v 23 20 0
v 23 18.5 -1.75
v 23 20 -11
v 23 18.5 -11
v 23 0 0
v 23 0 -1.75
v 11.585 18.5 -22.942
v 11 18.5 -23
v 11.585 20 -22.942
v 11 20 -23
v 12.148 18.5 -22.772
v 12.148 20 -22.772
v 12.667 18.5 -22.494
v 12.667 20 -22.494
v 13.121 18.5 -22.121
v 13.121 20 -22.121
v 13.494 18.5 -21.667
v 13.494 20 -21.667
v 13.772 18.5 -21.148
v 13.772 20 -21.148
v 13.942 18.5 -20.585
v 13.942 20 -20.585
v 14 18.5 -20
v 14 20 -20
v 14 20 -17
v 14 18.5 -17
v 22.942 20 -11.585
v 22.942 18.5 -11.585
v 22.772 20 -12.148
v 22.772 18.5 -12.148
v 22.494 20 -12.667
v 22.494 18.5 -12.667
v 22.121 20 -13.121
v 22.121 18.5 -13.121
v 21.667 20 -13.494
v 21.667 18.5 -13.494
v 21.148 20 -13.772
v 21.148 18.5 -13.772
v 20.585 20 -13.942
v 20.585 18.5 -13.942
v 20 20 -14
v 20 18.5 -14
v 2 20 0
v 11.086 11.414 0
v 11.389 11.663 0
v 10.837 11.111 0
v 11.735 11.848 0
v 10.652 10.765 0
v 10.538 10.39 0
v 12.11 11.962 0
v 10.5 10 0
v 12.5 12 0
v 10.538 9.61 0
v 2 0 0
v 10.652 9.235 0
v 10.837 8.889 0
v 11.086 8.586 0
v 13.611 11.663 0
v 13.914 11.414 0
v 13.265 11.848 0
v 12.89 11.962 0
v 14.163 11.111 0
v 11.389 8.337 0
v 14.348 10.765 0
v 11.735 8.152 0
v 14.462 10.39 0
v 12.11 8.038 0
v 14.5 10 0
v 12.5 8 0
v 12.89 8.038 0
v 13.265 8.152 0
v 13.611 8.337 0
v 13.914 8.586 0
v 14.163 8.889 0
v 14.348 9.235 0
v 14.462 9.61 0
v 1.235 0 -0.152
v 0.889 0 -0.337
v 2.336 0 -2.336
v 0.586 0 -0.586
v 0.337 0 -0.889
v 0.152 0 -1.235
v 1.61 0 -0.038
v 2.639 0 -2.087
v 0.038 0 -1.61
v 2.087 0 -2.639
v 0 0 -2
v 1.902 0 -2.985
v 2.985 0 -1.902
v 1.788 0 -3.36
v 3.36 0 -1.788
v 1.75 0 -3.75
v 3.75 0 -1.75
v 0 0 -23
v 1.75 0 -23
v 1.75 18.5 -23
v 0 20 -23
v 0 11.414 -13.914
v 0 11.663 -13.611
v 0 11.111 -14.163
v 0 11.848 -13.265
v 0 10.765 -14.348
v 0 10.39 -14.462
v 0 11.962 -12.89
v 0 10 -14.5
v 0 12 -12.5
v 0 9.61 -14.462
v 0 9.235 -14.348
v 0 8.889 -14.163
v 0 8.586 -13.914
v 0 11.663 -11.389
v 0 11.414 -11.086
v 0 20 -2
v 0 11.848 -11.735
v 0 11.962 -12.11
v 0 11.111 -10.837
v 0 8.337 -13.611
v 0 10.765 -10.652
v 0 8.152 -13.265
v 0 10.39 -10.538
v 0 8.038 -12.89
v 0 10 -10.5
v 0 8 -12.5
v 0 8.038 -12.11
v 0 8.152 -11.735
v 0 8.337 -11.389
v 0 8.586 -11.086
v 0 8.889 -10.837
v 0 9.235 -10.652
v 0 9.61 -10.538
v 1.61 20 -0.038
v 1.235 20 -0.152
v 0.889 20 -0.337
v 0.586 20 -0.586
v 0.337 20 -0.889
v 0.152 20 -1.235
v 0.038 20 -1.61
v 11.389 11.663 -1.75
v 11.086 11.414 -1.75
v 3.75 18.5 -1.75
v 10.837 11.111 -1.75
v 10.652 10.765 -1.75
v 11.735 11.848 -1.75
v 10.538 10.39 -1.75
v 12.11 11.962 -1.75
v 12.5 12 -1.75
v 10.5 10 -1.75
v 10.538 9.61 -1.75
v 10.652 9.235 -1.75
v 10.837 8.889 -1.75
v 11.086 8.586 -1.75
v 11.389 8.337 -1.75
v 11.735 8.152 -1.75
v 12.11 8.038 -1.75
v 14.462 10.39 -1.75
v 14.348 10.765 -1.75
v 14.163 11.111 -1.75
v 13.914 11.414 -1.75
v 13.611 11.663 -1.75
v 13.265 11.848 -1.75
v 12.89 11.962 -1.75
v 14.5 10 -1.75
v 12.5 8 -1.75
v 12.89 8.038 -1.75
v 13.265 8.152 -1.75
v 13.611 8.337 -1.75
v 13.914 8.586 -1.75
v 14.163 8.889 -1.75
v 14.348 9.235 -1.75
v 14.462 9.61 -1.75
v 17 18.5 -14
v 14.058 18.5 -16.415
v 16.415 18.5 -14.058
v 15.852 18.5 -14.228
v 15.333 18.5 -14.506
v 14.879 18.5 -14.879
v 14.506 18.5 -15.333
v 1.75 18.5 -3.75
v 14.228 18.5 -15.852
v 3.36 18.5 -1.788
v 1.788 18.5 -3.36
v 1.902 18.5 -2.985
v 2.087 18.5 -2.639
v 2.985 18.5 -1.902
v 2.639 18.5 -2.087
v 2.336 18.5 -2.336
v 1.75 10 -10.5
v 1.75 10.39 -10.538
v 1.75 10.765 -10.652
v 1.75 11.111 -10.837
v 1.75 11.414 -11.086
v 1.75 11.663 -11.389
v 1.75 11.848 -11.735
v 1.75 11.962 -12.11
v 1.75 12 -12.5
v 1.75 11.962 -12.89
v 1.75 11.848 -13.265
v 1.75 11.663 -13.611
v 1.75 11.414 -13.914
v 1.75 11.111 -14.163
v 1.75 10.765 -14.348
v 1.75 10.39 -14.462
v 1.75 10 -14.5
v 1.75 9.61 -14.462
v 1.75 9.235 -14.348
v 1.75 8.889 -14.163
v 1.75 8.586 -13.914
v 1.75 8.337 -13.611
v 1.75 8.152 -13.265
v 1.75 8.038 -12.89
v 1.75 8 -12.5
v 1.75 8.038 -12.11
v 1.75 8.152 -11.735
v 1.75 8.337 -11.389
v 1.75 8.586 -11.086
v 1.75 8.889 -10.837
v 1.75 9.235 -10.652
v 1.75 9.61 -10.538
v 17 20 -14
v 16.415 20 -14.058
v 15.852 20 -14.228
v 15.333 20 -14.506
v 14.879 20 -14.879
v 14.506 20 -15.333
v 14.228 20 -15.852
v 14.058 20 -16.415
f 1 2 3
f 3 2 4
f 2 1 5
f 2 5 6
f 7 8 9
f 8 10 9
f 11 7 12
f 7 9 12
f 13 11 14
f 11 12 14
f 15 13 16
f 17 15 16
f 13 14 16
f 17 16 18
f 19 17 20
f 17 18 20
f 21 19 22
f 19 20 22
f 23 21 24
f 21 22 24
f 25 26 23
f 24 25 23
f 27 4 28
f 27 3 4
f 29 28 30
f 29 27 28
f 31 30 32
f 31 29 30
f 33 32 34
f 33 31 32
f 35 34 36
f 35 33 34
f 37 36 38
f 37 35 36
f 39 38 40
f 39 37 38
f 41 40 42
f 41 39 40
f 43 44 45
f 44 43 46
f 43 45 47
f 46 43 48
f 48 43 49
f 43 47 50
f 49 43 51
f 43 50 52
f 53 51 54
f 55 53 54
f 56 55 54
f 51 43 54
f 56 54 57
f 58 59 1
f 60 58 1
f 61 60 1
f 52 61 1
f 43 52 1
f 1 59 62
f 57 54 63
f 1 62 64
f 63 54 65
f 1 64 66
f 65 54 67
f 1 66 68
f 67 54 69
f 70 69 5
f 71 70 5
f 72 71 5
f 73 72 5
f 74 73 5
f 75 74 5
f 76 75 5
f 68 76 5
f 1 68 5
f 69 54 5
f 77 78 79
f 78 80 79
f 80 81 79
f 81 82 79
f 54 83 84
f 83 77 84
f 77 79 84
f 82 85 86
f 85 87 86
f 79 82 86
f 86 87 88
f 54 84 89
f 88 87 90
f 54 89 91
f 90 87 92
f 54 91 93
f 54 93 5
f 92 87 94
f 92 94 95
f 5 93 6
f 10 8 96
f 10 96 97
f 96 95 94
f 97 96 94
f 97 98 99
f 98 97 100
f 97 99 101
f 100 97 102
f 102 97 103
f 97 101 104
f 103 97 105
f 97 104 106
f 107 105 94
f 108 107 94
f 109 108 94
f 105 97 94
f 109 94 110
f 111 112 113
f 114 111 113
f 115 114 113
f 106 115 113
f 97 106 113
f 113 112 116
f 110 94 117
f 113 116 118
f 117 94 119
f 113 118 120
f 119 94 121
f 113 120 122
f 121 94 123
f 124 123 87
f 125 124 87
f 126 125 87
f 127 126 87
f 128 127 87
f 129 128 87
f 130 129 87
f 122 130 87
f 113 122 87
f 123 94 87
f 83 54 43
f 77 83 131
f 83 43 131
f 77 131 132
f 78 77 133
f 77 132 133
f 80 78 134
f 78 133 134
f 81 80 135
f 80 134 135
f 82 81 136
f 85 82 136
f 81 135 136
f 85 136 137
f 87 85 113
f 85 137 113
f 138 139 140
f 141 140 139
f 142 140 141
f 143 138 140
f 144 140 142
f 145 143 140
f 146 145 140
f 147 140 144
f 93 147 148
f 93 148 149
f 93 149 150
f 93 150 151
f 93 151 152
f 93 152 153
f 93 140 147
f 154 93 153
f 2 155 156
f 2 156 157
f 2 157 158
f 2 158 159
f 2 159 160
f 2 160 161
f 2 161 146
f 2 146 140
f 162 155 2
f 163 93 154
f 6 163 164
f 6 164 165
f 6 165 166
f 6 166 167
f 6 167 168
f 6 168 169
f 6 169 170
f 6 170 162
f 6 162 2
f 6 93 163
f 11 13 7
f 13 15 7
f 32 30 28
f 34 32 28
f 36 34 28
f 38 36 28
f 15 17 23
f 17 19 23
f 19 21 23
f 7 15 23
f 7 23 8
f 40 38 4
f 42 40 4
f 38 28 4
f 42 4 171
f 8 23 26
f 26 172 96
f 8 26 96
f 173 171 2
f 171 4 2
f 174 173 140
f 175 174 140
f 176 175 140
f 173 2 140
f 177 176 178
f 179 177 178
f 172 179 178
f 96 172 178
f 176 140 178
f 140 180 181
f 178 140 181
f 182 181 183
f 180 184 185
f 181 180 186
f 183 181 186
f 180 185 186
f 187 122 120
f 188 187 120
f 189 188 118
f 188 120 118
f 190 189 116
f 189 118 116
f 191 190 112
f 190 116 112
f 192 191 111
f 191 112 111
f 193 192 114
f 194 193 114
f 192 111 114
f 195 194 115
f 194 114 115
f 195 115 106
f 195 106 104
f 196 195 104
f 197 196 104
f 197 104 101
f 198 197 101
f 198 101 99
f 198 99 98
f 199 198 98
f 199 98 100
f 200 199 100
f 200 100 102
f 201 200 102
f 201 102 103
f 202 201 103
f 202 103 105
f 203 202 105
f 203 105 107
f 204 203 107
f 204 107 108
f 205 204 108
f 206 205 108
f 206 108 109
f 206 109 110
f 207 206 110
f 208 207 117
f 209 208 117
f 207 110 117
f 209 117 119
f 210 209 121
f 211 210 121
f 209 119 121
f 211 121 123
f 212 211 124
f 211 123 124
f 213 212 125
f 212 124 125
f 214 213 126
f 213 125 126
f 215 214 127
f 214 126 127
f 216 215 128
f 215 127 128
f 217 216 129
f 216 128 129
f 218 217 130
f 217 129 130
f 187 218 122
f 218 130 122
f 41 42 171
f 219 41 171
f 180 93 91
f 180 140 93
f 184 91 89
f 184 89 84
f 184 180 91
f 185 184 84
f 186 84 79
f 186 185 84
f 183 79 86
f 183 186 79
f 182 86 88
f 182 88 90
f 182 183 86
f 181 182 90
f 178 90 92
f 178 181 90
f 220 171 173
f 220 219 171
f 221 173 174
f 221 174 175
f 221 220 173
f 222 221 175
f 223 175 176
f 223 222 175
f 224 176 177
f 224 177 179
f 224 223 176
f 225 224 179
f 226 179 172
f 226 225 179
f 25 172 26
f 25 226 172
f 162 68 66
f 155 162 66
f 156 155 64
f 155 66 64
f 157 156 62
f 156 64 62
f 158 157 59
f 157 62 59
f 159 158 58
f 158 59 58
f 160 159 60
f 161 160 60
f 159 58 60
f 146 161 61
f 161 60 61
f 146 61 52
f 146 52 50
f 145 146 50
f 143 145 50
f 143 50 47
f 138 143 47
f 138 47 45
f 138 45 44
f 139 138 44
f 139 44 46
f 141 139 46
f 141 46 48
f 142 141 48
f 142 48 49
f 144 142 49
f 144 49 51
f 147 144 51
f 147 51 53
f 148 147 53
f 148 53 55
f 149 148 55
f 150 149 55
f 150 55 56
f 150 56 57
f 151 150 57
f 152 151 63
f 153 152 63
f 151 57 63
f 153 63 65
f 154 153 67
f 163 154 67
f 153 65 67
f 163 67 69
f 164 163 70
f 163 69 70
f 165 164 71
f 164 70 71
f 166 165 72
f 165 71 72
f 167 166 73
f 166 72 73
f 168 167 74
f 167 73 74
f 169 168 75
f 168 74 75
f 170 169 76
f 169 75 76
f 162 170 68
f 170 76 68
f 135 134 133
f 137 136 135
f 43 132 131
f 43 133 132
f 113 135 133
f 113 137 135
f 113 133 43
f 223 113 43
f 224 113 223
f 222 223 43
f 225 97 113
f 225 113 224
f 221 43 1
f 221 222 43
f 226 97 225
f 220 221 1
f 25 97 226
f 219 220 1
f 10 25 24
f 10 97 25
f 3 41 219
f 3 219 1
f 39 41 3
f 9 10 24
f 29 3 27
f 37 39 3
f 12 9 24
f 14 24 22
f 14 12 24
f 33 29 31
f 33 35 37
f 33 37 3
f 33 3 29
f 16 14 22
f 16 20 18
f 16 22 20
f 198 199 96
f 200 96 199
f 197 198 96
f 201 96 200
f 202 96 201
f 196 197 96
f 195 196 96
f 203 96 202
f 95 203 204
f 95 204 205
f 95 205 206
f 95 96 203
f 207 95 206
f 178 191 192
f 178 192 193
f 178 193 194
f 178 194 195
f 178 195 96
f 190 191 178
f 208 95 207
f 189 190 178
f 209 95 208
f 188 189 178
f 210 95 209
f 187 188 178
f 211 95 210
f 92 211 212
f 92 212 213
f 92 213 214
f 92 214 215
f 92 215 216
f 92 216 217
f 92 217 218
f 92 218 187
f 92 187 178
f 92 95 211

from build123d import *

# Parameters (mm, degrees)
SALIENTE_EXTRUIR1_DEPTH = 20
CORTAR_EXTRUIR1_DEPTH   = 18.5
REDONDEO1_R             = 2
REDONDEO2_R             = 3
CROQUIS3_R              = 2
CORTAR_EXTRUIR2_DEPTH   = 18.5
CROQUIS4_R              = 2
CORTAR_EXTRUIR3_DEPTH   = 18.5


with BuildPart() as part:
    # Croquis1 → Saliente-Extruir1 (new body)
    with BuildSketch(Plane(origin=(0, 0, 0), x_dir=(1, 0, 0), z_dir=(0, 1, 0))):
        Polygon((0, 0), (23, 0), (23, 14), (14, 14), (14, 23), (0, 23), align=None)
    extrude(amount=SALIENTE_EXTRUIR1_DEPTH)

    # Croquis2 → Cortar-Extruir1 (cut)
    with BuildSketch(Plane.XZ):
        Polygon((1.75, -23), (1.75, -1.75), (23, -1.75), (23, -14), (14, -14), (14, -23), align=None)
    extrude(amount=-CORTAR_EXTRUIR1_DEPTH, mode=Mode.SUBTRACT)

    # Redondeo1
    redondeo1_edges = [part.edges().sort_by_distance(p)[0] for p in [
        (0, 10, 0),
        (1.75, 9.25, -1.75),
    ]]
    fillet(redondeo1_edges, radius=REDONDEO1_R)

    # Redondeo2
    redondeo2_edges = [part.edges().sort_by_distance(p)[0] for p in [
        (14, 19.25, -23),
        (14, 19.25, -14),
        (23, 19.25, -14),
    ]]
    fillet(redondeo2_edges, radius=REDONDEO2_R)

    # Croquis3 → Cortar-Extruir2 (cut)
    with BuildSketch(Plane.ZY):
        with Locations((-12.5, 10)):
            Circle(CROQUIS3_R)
    extrude(amount=-CORTAR_EXTRUIR2_DEPTH, mode=Mode.SUBTRACT)

    # Croquis4 → Cortar-Extruir3 (cut)
    with BuildSketch(Plane.XY):
        with Locations((12.5, 10)):
            Circle(CROQUIS4_R)
    extrude(amount=-CORTAR_EXTRUIR3_DEPTH, mode=Mode.SUBTRACT)


solid = part.part
